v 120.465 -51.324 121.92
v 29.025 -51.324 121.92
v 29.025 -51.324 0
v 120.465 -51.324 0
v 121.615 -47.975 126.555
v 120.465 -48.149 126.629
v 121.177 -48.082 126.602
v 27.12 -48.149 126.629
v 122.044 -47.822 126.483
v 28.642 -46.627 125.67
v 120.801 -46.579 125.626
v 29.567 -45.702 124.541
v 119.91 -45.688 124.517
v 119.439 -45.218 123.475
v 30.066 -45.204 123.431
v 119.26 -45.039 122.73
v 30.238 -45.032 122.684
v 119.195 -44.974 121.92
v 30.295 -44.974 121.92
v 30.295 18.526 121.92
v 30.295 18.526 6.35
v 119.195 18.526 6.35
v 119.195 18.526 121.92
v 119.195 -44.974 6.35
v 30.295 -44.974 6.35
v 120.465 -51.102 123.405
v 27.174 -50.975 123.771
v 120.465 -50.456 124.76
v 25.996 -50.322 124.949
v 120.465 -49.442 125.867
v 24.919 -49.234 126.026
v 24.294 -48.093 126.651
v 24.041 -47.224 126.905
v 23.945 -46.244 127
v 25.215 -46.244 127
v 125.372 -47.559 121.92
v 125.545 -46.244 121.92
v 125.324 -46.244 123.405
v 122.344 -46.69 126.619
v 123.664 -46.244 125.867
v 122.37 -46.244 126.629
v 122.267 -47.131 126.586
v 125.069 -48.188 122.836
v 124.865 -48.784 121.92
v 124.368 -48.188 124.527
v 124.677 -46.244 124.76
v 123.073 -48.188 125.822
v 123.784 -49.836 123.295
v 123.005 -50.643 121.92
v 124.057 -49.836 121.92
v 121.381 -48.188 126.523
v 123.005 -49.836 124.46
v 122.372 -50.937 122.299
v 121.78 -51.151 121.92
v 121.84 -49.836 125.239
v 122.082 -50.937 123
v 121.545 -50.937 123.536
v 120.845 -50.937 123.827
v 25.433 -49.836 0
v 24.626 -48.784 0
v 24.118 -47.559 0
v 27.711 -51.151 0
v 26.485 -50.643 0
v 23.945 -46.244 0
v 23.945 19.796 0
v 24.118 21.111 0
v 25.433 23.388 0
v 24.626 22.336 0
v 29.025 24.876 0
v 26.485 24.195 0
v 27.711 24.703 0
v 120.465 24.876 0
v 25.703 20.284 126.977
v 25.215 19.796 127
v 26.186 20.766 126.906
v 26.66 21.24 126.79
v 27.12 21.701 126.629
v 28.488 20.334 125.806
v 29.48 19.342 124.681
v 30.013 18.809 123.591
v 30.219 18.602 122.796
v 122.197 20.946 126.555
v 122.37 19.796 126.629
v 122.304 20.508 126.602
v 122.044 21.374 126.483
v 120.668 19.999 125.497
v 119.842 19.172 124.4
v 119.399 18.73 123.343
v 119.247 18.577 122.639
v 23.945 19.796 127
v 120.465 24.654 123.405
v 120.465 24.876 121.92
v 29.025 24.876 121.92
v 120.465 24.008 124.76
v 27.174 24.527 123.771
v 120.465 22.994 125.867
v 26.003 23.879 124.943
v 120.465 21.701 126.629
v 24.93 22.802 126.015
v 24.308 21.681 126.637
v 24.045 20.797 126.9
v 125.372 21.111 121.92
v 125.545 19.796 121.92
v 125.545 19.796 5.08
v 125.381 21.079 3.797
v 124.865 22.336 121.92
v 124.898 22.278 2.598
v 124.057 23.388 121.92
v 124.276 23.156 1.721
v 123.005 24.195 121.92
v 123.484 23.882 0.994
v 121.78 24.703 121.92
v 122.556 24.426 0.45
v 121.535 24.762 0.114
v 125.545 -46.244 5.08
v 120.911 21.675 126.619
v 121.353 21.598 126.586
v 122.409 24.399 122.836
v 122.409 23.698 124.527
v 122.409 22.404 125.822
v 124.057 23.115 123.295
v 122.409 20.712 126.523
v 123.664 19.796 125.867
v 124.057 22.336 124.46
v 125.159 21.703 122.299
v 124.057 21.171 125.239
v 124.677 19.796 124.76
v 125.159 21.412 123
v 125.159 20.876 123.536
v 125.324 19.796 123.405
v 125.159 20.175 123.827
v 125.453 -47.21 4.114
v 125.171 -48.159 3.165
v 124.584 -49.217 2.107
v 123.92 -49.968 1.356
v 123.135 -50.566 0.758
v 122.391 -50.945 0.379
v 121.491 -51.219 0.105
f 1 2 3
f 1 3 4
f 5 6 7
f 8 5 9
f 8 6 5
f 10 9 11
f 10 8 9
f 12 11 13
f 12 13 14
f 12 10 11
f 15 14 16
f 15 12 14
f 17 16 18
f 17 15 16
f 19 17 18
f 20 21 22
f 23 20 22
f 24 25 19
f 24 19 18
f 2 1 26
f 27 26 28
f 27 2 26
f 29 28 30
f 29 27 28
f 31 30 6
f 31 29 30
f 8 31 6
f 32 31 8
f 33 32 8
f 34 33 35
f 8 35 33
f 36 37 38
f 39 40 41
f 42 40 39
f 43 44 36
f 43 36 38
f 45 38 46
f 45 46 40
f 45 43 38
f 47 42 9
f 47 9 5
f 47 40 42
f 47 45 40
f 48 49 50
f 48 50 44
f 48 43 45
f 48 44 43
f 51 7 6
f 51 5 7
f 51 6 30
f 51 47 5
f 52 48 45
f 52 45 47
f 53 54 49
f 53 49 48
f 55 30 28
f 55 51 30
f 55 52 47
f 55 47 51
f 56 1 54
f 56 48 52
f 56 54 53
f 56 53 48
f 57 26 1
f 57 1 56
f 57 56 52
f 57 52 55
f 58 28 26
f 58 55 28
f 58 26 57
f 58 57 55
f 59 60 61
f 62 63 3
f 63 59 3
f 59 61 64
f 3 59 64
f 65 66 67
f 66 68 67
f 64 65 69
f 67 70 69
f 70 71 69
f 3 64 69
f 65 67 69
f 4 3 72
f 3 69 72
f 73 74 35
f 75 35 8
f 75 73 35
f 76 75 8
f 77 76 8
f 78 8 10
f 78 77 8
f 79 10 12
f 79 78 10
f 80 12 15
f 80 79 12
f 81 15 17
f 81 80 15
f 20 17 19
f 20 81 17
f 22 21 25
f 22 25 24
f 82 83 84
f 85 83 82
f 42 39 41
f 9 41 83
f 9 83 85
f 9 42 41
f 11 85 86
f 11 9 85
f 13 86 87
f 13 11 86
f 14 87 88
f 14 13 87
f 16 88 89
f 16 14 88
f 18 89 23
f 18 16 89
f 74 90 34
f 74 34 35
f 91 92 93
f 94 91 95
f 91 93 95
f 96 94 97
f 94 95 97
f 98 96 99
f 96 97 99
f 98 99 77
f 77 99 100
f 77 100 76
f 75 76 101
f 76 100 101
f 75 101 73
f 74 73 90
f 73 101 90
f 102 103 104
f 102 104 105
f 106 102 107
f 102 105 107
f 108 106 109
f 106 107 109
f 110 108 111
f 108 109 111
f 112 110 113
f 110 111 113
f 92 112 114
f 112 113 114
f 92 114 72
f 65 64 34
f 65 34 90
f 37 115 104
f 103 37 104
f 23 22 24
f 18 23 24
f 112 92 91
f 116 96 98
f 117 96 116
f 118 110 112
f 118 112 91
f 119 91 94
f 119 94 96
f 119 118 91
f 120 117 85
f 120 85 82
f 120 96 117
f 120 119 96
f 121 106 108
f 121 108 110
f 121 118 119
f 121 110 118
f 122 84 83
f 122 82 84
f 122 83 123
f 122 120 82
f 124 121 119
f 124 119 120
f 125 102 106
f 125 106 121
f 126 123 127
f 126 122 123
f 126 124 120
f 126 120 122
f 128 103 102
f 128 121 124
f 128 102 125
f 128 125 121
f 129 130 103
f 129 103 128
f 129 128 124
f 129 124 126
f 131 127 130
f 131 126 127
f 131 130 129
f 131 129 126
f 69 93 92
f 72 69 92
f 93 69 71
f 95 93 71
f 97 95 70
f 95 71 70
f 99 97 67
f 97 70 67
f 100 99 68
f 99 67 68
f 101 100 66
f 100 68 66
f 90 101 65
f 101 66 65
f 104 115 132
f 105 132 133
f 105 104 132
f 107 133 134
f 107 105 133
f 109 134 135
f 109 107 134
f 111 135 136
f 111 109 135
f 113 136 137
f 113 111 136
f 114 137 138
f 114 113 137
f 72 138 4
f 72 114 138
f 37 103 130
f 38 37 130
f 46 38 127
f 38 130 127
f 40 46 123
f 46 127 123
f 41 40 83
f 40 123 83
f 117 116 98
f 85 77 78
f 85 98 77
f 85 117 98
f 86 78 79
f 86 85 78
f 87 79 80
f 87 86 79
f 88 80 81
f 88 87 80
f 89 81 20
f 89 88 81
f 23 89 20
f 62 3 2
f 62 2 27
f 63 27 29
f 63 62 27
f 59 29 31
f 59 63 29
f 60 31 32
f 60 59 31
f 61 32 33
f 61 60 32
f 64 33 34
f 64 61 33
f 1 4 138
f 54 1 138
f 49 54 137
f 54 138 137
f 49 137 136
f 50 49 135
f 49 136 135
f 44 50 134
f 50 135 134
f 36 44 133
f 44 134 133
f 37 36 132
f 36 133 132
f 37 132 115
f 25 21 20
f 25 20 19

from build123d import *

# Parameters (mm, degrees)
F0_W         = 101.6
F0_H         = 76.2
F1_DEPTH     = 127
F2_T         = -6.35
F3_T1_DEPTH  = 152.4
F3_T3_DEPTH  = 134.62
F3_T5_DEPTH  = 101.6
F3_T7_DEPTH  = 66.04
F3_T9_DEPTH  = 109.22
F3_T11_DEPTH = 88.9
F3_T13_DEPTH = 63.5
F3_S17_W     = 5.1816
F3_S17_H     = 5.1816
F3_T18_DEPTH = 5.1816
F3_S23_W     = 5.1816
F3_S23_H     = 5.1816
F3_T24_DEPTH = 5.1816
F3_T31_DEPTH = 101.6
F3_T36_DEPTH = 76.2
F3_T44_DEPTH = 76.2
F3_T49_DEPTH = 101.6
F3_T57_DEPTH = 101.6
F3_T62_DEPTH = 76.2
F3_T70_DEPTH = 101.6
F3_T75_DEPTH = 76.2


# Not quite as in the source:
# - a fillet or chamfer that OpenCascade refuses, or shapes differently, is made with other operations: its cross-section is extruded or revolved along the edge and cut away or added


with BuildPart() as f1:
    # F0 (on Top) → F1 (new body)
    with BuildSketch(Plane.XY):
        with Locations((74.7453766656, -13.2239237391)):
            Rectangle(F0_W, F0_H)
    extrude(amount=F1_DEPTH)

    # F2
    f2_openings = [f1.faces().sort_by_distance(p)[0] for p in [
        (74.745377, -13.223924, 127),
    ]]
    offset(amount=F2_T, openings=f2_openings)

    # F3: fillet of radius 5.08 on 12 edges, made by hand

    # F3_s2 → F3_t1 (cut)
    with BuildSketch(Plane.XY.offset(-12.7)):
        with BuildLine():
            ThreePointArc((29.0253766656, 24.8760762609), (25.4332742171, 23.3881787093), (23.9453766656, 19.7960762609))
            Line((23.9453766656, 19.7960762609), (23.9453766656, 24.8760762609))
            Line((23.9453766656, 24.8760762609), (29.0253766656, 24.8760762609))
        make_face()
        with BuildLine():
            ThreePointArc((29.0253766656, -51.3239237391), (25.4332742171, -49.8360261876), (23.9453766656, -46.2439237391))
            Line((23.9453766656, -46.2439237391), (23.9453766656, -51.3239237391))
            Line((23.9453766656, -51.3239237391), (29.0253766656, -51.3239237391))
        make_face()
    extrude(amount=F3_T1_DEPTH, mode=Mode.SUBTRACT)

    # F3_s4 → F3_t3 (cut)
    with BuildSketch(Plane.XY.offset(-12.7)):
        with BuildLine():
            ThreePointArc((125.5453766656, 19.7960762609), (124.057479114, 23.3881787093), (120.4653766656, 24.8760762609))
            Line((120.4653766656, 24.8760762609), (125.5453766656, 24.8760762609))
            Line((125.5453766656, 24.8760762609), (125.5453766656, 19.7960762609))
        make_face()
        with BuildLine():
            ThreePointArc((120.4653766656, -51.3239237391), (124.057479114, -49.8360261876), (125.5453766656, -46.2439237391))
            Line((125.5453766656, -46.2439237391), (125.5453766656, -51.3239237391))
            Line((125.5453766656, -51.3239237391), (120.4653766656, -51.3239237391))
        make_face()
    extrude(amount=F3_T3_DEPTH, mode=Mode.SUBTRACT)

    # F3_s6 → F3_t5 (cut)
    with BuildSketch(Plane.XZ.offset(-37.5760762609)):
        with BuildLine():
            ThreePointArc((125.5453766656, 5.08), (124.057479114, 1.4878975516), (120.4653766656, 0))
            Line((120.4653766656, 0), (125.5453766656, 0))
            Line((125.5453766656, 0), (125.5453766656, 5.08))
        make_face()
    extrude(amount=F3_T5_DEPTH, mode=Mode.SUBTRACT)

    # F3_s8 → F3_t7 (cut)
    with BuildSketch(Plane.XZ.offset(-19.7960762609)):
        with BuildLine():
            ThreePointArc((125.5453766656, 121.92), (124.057479114, 125.5121024484), (120.4653766656, 127))
            Line((120.4653766656, 127), (125.5453766656, 127))
            Line((125.5453766656, 127), (125.5453766656, 121.92))
        make_face()
    extrude(amount=F3_T7_DEPTH, mode=Mode.SUBTRACT)

    # F3_s10 → F3_t9 (cut)
    with BuildSketch(Plane.YZ.offset(11.2453766656)):
        with BuildLine():
            ThreePointArc((-51.3239237391, 121.92), (-49.8360261876, 125.5121024484), (-46.2439237391, 127))
            Line((-46.2439237391, 127), (-51.3239237391, 127))
            Line((-51.3239237391, 127), (-51.3239237391, 121.92))
        make_face()
        with BuildLine():
            ThreePointArc((24.8760762609, 121.92), (23.3881787093, 125.5121024484), (19.7960762609, 127))
            Line((19.7960762609, 127), (24.8760762609, 127))
            Line((24.8760762609, 127), (24.8760762609, 121.92))
        make_face()
    extrude(amount=F3_T9_DEPTH, mode=Mode.SUBTRACT)

    # F3_s12 → F3_t11 (cut)
    with BuildSketch(Plane.YZ.offset(30.2953766656)):
        with BuildLine():
            ThreePointArc((23.6060762609, 127), (20.0139738124, 125.5121024484), (18.5260762609, 121.92))
            Line((18.5260762609, 121.92), (18.5260762609, 127))
            Line((18.5260762609, 127), (23.6060762609, 127))
        make_face()
        with BuildLine():
            ThreePointArc((-50.0539237391, 127), (-46.4618212907, 125.5121024484), (-44.9739237391, 121.92))
            Line((-44.9739237391, 121.92), (-44.9739237391, 127))
            Line((-44.9739237391, 127), (-50.0539237391, 127))
        make_face()
    extrude(amount=F3_T11_DEPTH, mode=Mode.SUBTRACT)

    # F3_s14 → F3_t13 (cut)
    with BuildSketch(Plane.XZ.offset(-18.5260762609)):
        with BuildLine():
            ThreePointArc((25.2153766656, 127), (28.807479114, 125.5121024484), (30.2953766656, 121.92))
            Line((30.2953766656, 121.92), (30.2953766656, 127))
            Line((30.2953766656, 127), (25.2153766656, 127))
        make_face()
        with BuildLine():
            ThreePointArc((124.2753766656, 127), (120.6832742171, 125.5121024484), (119.1953766656, 121.92))
            Line((119.1953766656, 121.92), (119.1953766656, 127))
            Line((119.1953766656, 127), (124.2753766656, 127))
        make_face()
    extrude(amount=F3_T13_DEPTH, mode=Mode.SUBTRACT)


with BuildPart() as f3_tool16:
    # F3_s17 → F3_t18 (new body)
    with BuildSketch(Plane.YZ.offset(120.4653766656)):
        with Locations((22.3868762609, 124.5108)):
            Rectangle(F3_S17_W, F3_S17_H)
    extrude(amount=F3_T18_DEPTH)

    # F3_s19 → F3_t20 (revolve, cut)
    with BuildSketch(Plane(origin=(120.4653766656, 19.7960762609, 121.92), x_dir=(0, -0.7071067812, -0.7071067812), z_dir=(0, -0.7071067812, 0.7071067812))):
        with BuildLine():
            ThreePointArc((0, -5.08), (5.08, 0), (0, 5.08))
            Line((0, 5.08), (0, -5.08))
        make_face()
    revolve(axis=Axis((120.4653766656, 19.7960762609, 121.92), (1, 0, 0)), mode=Mode.SUBTRACT)


with BuildPart() as f1_1:
    add(f1.part)

    # F3_t15: cut F3_tool16
    add(f3_tool16.part, mode=Mode.SUBTRACT)


with BuildPart() as f3_tool22:
    # F3_s23 → F3_t24 (new body)
    with BuildSketch(Plane.XZ.offset(46.2439237391)):
        with Locations((123.0561766656, 124.5108)):
            Rectangle(F3_S23_W, F3_S23_H)
    extrude(amount=F3_T24_DEPTH)

    # F3_s25 → F3_t26 (revolve, cut)
    with BuildSketch(Plane(origin=(120.4653766656, -46.2439237391, 121.92), x_dir=(-0.7071067812, 0, -0.7071067812), z_dir=(-0.7071067812, 0, 0.7071067812))):
        with BuildLine():
            ThreePointArc((0, -5.08), (5.08, 0), (0, 5.08))
            Line((0, 5.08), (0, -5.08))
        make_face()
    revolve(axis=Axis((120.4653766656, -46.2439237391, 121.92), (0, -1, 0)), mode=Mode.SUBTRACT)


with BuildPart() as f1_2:
    add(f1_1.part)

    # F3_t21: cut F3_tool22
    add(f3_tool22.part, mode=Mode.SUBTRACT)


with BuildPart() as f3_tool29:
    # F3_s30 → F3_t31 (new body)
    with BuildSketch(Plane.YZ.offset(131.8953766656)):
        with BuildLine():
            ThreePointArc((23.6060762609, 127), (20.0139738124, 125.5121024484), (18.5260762609, 121.92))
            Line((18.5260762609, 121.92), (18.5260762609, 127))
            Line((18.5260762609, 127), (23.6060762609, 127))
        make_face()
    extrude(amount=-F3_T31_DEPTH)

    split(bisect_by=Plane.YZ.offset(125.5453766656), keep=Keep.BOTTOM)

    split(bisect_by=Plane.YZ.offset(119.1953766656), keep=Keep.TOP)


with BuildPart() as f3_tool34:
    # F3_s35 → F3_t36 (new body)
    with BuildSketch(Plane.XZ.offset(44.9739237391)):
        with BuildLine():
            ThreePointArc((124.2753766656, 127), (120.6832742171, 125.5121024484), (119.1953766656, 121.92))
            Line((119.1953766656, 121.92), (119.1953766656, 127))
            Line((119.1953766656, 127), (124.2753766656, 127))
        make_face()
    extrude(amount=-F3_T36_DEPTH)

    split(bisect_by=Plane.XZ.offset(-24.8760762609), keep=Keep.TOP)

    split(bisect_by=Plane.XZ.offset(-18.5260762609), keep=Keep.BOTTOM)


with BuildPart() as f3_tool29_1:
    add(f3_tool29.part)

    # F3_t39: intersect F3_tool34
    add(f3_tool34.part, mode=Mode.INTERSECT)


with BuildPart() as f1_3:
    add(f1_2.part)

    # F3_t27: cut F3_tool29
    add(f3_tool29_1.part, mode=Mode.SUBTRACT)


with BuildPart() as f3_tool42:
    # F3_s43 → F3_t44 (new body)
    with BuildSketch(Plane.XZ.offset(-31.2260762609)):
        with BuildLine():
            ThreePointArc((25.2153766656, 127), (28.807479114, 125.5121024484), (30.2953766656, 121.92))
            Line((30.2953766656, 121.92), (30.2953766656, 127))
            Line((30.2953766656, 127), (25.2153766656, 127))
        make_face()
    extrude(amount=F3_T44_DEPTH)

    split(bisect_by=Plane.XZ.offset(-24.8760762609), keep=Keep.TOP)

    split(bisect_by=Plane.XZ.offset(-18.5260762609), keep=Keep.BOTTOM)


with BuildPart() as f3_tool47:
    # F3_s48 → F3_t49 (new body)
    with BuildSketch(Plane.YZ.offset(119.1953766656)):
        with BuildLine():
            ThreePointArc((23.6060762609, 127), (20.0139738124, 125.5121024484), (18.5260762609, 121.92))
            Line((18.5260762609, 121.92), (18.5260762609, 127))
            Line((18.5260762609, 127), (23.6060762609, 127))
        make_face()
    extrude(amount=-F3_T49_DEPTH)

    split(bisect_by=Plane.YZ.offset(23.9453766656), keep=Keep.TOP)

    split(bisect_by=Plane.YZ.offset(30.2953766656), keep=Keep.BOTTOM)


with BuildPart() as f3_tool42_1:
    add(f3_tool42.part)

    # F3_t52: intersect F3_tool47
    add(f3_tool47.part, mode=Mode.INTERSECT)


with BuildPart() as f1_4:
    add(f1_3.part)

    # F3_t40: cut F3_tool42
    add(f3_tool42_1.part, mode=Mode.SUBTRACT)


with BuildPart() as f3_tool55:
    # F3_s56 → F3_t57 (new body)
    with BuildSketch(Plane.YZ.offset(17.5953766656)):
        with BuildLine():
            ThreePointArc((-50.0539237391, 127), (-46.4618212907, 125.5121024484), (-44.9739237391, 121.92))
            Line((-44.9739237391, 121.92), (-44.9739237391, 127))
            Line((-44.9739237391, 127), (-50.0539237391, 127))
        make_face()
    extrude(amount=F3_T57_DEPTH)

    split(bisect_by=Plane.YZ.offset(23.9453766656), keep=Keep.TOP)

    split(bisect_by=Plane.YZ.offset(30.2953766656), keep=Keep.BOTTOM)


with BuildPart() as f3_tool60:
    # F3_s61 → F3_t62 (new body)
    with BuildSketch(Plane.XZ.offset(-18.5260762609)):
        with BuildLine():
            ThreePointArc((25.2153766656, 127), (28.807479114, 125.5121024484), (30.2953766656, 121.92))
            Line((30.2953766656, 121.92), (30.2953766656, 127))
            Line((30.2953766656, 127), (25.2153766656, 127))
        make_face()
    extrude(amount=F3_T62_DEPTH)

    split(bisect_by=Plane.XZ.offset(51.3239237391), keep=Keep.BOTTOM)

    split(bisect_by=Plane.XZ.offset(44.9739237391), keep=Keep.TOP)


with BuildPart() as f3_tool55_1:
    add(f3_tool55.part)

    # F3_t65: intersect F3_tool60
    add(f3_tool60.part, mode=Mode.INTERSECT)


with BuildPart() as f1_5:
    add(f1_4.part)

    # F3_t53: cut F3_tool55
    add(f3_tool55_1.part, mode=Mode.SUBTRACT)


with BuildPart() as f3_tool68:
    # F3_s69 → F3_t70 (new body)
    with BuildSketch(Plane.YZ.offset(30.2953766656)):
        with BuildLine():
            ThreePointArc((-50.0539237391, 127), (-46.4618212907, 125.5121024484), (-44.9739237391, 121.92))
            Line((-44.9739237391, 121.92), (-44.9739237391, 127))
            Line((-44.9739237391, 127), (-50.0539237391, 127))
        make_face()
    extrude(amount=F3_T70_DEPTH)

    split(bisect_by=Plane.YZ.offset(125.5453766656), keep=Keep.BOTTOM)

    split(bisect_by=Plane.YZ.offset(119.1953766656), keep=Keep.TOP)


with BuildPart() as f3_tool73:
    # F3_s74 → F3_t75 (new body)
    with BuildSketch(Plane.XZ.offset(57.6739237391)):
        with BuildLine():
            ThreePointArc((124.2753766656, 127), (120.6832742171, 125.5121024484), (119.1953766656, 121.92))
            Line((119.1953766656, 121.92), (119.1953766656, 127))
            Line((119.1953766656, 127), (124.2753766656, 127))
        make_face()
    extrude(amount=-F3_T75_DEPTH)

    split(bisect_by=Plane.XZ.offset(51.3239237391), keep=Keep.BOTTOM)

    split(bisect_by=Plane.XZ.offset(44.9739237391), keep=Keep.TOP)


with BuildPart() as f3_tool68_1:
    add(f3_tool68.part)

    # F3_t78: intersect F3_tool73
    add(f3_tool73.part, mode=Mode.INTERSECT)


with BuildPart() as f1_6:
    add(f1_5.part)

    # F3_t66: cut F3_tool68
    add(f3_tool68_1.part, mode=Mode.SUBTRACT)


solid = f1_6.part
